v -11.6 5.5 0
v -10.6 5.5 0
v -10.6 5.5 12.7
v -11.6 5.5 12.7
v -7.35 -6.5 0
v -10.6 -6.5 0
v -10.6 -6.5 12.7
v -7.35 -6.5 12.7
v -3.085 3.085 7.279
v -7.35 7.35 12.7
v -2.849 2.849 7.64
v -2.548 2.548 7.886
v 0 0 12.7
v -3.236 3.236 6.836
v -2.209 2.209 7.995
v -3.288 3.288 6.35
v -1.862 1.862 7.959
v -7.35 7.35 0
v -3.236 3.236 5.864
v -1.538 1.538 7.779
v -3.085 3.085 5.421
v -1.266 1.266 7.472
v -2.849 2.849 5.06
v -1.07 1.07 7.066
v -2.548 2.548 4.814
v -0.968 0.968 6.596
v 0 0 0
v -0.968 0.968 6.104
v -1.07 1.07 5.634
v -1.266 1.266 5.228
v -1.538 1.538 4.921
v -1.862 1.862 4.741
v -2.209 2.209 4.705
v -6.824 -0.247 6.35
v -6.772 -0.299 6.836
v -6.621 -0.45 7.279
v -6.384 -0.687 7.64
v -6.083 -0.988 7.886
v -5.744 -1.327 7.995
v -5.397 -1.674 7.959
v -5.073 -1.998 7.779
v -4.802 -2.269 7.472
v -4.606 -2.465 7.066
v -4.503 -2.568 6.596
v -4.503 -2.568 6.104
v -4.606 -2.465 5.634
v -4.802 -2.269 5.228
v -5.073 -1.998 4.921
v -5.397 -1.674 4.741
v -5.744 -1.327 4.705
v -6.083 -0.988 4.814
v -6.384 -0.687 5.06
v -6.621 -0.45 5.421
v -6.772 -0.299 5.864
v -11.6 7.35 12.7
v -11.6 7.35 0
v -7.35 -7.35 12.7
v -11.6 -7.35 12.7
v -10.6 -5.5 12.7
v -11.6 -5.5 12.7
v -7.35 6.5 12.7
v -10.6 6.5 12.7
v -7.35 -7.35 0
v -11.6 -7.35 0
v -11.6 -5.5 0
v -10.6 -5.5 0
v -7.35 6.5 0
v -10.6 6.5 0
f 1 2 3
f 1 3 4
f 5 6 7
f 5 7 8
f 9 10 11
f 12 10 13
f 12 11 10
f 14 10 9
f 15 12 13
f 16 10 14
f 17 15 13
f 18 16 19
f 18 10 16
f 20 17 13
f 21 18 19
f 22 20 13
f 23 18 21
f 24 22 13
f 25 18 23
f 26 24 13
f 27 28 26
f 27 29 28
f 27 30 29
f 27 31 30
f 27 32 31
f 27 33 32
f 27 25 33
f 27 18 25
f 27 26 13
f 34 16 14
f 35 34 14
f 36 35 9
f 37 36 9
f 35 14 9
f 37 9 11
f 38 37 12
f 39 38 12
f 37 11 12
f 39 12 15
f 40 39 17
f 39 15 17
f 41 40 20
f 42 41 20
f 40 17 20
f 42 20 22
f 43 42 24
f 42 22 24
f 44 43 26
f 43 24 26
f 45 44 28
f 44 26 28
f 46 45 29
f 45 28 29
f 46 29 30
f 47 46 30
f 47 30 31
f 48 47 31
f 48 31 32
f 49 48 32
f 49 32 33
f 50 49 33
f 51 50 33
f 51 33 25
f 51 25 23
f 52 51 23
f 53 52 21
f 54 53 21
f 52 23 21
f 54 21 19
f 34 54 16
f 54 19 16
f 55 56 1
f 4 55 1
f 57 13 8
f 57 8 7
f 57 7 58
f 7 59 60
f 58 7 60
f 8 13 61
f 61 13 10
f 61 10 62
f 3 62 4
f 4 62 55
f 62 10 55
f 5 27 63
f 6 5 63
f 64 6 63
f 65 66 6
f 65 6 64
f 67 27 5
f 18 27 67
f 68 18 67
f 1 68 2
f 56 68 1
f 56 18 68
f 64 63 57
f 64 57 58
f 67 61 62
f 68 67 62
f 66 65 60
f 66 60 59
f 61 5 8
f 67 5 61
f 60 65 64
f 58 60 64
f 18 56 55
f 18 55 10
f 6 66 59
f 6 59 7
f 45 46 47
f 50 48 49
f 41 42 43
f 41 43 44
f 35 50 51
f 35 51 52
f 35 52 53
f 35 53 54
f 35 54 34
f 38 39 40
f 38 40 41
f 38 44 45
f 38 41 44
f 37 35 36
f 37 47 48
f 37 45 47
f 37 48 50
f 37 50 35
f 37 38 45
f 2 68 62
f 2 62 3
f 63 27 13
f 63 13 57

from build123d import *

# Parameters (mm, degrees)
BOSS_EXTRUDE1_DEPTH = 12.7
SKETCH7_R           = 1.65
CUT_EXTRUDE2_DEPTH  = 5


with BuildPart() as part:
    # Sketch1 → Boss-Extrude1 (new body)
    with BuildSketch(Plane.XY):
        Polygon((-7.35, 7.35), (0, 0), (-7.35, -7.35), (-11.6, -7.35), (-11.6, -6.5), (-11.6, -5.5), (-10.6, -5.5), (-10.6, -6.5), (-7.35, -6.5), (-7.35, 6.5), (-10.6, 6.5), (-10.6, 5.5), (-11.6, 5.5), (-11.6, 6.5), (-11.6, 7.35), align=None)
    extrude(amount=BOSS_EXTRUDE1_DEPTH)

    # Sketch7 → Cut-Extrude2 (cut)
    with BuildSketch(Plane(origin=(0, 0, 0), x_dir=(0, 0, -1), z_dir=(0.7071067811865724, 0.7071067811865226, 0))):
        with Locations(Location((-6.35, 3, 0), (0, 0, 90))):
            Circle(SKETCH7_R)
    extrude(amount=-CUT_EXTRUDE2_DEPTH, mode=Mode.SUBTRACT)


solid = part.part
